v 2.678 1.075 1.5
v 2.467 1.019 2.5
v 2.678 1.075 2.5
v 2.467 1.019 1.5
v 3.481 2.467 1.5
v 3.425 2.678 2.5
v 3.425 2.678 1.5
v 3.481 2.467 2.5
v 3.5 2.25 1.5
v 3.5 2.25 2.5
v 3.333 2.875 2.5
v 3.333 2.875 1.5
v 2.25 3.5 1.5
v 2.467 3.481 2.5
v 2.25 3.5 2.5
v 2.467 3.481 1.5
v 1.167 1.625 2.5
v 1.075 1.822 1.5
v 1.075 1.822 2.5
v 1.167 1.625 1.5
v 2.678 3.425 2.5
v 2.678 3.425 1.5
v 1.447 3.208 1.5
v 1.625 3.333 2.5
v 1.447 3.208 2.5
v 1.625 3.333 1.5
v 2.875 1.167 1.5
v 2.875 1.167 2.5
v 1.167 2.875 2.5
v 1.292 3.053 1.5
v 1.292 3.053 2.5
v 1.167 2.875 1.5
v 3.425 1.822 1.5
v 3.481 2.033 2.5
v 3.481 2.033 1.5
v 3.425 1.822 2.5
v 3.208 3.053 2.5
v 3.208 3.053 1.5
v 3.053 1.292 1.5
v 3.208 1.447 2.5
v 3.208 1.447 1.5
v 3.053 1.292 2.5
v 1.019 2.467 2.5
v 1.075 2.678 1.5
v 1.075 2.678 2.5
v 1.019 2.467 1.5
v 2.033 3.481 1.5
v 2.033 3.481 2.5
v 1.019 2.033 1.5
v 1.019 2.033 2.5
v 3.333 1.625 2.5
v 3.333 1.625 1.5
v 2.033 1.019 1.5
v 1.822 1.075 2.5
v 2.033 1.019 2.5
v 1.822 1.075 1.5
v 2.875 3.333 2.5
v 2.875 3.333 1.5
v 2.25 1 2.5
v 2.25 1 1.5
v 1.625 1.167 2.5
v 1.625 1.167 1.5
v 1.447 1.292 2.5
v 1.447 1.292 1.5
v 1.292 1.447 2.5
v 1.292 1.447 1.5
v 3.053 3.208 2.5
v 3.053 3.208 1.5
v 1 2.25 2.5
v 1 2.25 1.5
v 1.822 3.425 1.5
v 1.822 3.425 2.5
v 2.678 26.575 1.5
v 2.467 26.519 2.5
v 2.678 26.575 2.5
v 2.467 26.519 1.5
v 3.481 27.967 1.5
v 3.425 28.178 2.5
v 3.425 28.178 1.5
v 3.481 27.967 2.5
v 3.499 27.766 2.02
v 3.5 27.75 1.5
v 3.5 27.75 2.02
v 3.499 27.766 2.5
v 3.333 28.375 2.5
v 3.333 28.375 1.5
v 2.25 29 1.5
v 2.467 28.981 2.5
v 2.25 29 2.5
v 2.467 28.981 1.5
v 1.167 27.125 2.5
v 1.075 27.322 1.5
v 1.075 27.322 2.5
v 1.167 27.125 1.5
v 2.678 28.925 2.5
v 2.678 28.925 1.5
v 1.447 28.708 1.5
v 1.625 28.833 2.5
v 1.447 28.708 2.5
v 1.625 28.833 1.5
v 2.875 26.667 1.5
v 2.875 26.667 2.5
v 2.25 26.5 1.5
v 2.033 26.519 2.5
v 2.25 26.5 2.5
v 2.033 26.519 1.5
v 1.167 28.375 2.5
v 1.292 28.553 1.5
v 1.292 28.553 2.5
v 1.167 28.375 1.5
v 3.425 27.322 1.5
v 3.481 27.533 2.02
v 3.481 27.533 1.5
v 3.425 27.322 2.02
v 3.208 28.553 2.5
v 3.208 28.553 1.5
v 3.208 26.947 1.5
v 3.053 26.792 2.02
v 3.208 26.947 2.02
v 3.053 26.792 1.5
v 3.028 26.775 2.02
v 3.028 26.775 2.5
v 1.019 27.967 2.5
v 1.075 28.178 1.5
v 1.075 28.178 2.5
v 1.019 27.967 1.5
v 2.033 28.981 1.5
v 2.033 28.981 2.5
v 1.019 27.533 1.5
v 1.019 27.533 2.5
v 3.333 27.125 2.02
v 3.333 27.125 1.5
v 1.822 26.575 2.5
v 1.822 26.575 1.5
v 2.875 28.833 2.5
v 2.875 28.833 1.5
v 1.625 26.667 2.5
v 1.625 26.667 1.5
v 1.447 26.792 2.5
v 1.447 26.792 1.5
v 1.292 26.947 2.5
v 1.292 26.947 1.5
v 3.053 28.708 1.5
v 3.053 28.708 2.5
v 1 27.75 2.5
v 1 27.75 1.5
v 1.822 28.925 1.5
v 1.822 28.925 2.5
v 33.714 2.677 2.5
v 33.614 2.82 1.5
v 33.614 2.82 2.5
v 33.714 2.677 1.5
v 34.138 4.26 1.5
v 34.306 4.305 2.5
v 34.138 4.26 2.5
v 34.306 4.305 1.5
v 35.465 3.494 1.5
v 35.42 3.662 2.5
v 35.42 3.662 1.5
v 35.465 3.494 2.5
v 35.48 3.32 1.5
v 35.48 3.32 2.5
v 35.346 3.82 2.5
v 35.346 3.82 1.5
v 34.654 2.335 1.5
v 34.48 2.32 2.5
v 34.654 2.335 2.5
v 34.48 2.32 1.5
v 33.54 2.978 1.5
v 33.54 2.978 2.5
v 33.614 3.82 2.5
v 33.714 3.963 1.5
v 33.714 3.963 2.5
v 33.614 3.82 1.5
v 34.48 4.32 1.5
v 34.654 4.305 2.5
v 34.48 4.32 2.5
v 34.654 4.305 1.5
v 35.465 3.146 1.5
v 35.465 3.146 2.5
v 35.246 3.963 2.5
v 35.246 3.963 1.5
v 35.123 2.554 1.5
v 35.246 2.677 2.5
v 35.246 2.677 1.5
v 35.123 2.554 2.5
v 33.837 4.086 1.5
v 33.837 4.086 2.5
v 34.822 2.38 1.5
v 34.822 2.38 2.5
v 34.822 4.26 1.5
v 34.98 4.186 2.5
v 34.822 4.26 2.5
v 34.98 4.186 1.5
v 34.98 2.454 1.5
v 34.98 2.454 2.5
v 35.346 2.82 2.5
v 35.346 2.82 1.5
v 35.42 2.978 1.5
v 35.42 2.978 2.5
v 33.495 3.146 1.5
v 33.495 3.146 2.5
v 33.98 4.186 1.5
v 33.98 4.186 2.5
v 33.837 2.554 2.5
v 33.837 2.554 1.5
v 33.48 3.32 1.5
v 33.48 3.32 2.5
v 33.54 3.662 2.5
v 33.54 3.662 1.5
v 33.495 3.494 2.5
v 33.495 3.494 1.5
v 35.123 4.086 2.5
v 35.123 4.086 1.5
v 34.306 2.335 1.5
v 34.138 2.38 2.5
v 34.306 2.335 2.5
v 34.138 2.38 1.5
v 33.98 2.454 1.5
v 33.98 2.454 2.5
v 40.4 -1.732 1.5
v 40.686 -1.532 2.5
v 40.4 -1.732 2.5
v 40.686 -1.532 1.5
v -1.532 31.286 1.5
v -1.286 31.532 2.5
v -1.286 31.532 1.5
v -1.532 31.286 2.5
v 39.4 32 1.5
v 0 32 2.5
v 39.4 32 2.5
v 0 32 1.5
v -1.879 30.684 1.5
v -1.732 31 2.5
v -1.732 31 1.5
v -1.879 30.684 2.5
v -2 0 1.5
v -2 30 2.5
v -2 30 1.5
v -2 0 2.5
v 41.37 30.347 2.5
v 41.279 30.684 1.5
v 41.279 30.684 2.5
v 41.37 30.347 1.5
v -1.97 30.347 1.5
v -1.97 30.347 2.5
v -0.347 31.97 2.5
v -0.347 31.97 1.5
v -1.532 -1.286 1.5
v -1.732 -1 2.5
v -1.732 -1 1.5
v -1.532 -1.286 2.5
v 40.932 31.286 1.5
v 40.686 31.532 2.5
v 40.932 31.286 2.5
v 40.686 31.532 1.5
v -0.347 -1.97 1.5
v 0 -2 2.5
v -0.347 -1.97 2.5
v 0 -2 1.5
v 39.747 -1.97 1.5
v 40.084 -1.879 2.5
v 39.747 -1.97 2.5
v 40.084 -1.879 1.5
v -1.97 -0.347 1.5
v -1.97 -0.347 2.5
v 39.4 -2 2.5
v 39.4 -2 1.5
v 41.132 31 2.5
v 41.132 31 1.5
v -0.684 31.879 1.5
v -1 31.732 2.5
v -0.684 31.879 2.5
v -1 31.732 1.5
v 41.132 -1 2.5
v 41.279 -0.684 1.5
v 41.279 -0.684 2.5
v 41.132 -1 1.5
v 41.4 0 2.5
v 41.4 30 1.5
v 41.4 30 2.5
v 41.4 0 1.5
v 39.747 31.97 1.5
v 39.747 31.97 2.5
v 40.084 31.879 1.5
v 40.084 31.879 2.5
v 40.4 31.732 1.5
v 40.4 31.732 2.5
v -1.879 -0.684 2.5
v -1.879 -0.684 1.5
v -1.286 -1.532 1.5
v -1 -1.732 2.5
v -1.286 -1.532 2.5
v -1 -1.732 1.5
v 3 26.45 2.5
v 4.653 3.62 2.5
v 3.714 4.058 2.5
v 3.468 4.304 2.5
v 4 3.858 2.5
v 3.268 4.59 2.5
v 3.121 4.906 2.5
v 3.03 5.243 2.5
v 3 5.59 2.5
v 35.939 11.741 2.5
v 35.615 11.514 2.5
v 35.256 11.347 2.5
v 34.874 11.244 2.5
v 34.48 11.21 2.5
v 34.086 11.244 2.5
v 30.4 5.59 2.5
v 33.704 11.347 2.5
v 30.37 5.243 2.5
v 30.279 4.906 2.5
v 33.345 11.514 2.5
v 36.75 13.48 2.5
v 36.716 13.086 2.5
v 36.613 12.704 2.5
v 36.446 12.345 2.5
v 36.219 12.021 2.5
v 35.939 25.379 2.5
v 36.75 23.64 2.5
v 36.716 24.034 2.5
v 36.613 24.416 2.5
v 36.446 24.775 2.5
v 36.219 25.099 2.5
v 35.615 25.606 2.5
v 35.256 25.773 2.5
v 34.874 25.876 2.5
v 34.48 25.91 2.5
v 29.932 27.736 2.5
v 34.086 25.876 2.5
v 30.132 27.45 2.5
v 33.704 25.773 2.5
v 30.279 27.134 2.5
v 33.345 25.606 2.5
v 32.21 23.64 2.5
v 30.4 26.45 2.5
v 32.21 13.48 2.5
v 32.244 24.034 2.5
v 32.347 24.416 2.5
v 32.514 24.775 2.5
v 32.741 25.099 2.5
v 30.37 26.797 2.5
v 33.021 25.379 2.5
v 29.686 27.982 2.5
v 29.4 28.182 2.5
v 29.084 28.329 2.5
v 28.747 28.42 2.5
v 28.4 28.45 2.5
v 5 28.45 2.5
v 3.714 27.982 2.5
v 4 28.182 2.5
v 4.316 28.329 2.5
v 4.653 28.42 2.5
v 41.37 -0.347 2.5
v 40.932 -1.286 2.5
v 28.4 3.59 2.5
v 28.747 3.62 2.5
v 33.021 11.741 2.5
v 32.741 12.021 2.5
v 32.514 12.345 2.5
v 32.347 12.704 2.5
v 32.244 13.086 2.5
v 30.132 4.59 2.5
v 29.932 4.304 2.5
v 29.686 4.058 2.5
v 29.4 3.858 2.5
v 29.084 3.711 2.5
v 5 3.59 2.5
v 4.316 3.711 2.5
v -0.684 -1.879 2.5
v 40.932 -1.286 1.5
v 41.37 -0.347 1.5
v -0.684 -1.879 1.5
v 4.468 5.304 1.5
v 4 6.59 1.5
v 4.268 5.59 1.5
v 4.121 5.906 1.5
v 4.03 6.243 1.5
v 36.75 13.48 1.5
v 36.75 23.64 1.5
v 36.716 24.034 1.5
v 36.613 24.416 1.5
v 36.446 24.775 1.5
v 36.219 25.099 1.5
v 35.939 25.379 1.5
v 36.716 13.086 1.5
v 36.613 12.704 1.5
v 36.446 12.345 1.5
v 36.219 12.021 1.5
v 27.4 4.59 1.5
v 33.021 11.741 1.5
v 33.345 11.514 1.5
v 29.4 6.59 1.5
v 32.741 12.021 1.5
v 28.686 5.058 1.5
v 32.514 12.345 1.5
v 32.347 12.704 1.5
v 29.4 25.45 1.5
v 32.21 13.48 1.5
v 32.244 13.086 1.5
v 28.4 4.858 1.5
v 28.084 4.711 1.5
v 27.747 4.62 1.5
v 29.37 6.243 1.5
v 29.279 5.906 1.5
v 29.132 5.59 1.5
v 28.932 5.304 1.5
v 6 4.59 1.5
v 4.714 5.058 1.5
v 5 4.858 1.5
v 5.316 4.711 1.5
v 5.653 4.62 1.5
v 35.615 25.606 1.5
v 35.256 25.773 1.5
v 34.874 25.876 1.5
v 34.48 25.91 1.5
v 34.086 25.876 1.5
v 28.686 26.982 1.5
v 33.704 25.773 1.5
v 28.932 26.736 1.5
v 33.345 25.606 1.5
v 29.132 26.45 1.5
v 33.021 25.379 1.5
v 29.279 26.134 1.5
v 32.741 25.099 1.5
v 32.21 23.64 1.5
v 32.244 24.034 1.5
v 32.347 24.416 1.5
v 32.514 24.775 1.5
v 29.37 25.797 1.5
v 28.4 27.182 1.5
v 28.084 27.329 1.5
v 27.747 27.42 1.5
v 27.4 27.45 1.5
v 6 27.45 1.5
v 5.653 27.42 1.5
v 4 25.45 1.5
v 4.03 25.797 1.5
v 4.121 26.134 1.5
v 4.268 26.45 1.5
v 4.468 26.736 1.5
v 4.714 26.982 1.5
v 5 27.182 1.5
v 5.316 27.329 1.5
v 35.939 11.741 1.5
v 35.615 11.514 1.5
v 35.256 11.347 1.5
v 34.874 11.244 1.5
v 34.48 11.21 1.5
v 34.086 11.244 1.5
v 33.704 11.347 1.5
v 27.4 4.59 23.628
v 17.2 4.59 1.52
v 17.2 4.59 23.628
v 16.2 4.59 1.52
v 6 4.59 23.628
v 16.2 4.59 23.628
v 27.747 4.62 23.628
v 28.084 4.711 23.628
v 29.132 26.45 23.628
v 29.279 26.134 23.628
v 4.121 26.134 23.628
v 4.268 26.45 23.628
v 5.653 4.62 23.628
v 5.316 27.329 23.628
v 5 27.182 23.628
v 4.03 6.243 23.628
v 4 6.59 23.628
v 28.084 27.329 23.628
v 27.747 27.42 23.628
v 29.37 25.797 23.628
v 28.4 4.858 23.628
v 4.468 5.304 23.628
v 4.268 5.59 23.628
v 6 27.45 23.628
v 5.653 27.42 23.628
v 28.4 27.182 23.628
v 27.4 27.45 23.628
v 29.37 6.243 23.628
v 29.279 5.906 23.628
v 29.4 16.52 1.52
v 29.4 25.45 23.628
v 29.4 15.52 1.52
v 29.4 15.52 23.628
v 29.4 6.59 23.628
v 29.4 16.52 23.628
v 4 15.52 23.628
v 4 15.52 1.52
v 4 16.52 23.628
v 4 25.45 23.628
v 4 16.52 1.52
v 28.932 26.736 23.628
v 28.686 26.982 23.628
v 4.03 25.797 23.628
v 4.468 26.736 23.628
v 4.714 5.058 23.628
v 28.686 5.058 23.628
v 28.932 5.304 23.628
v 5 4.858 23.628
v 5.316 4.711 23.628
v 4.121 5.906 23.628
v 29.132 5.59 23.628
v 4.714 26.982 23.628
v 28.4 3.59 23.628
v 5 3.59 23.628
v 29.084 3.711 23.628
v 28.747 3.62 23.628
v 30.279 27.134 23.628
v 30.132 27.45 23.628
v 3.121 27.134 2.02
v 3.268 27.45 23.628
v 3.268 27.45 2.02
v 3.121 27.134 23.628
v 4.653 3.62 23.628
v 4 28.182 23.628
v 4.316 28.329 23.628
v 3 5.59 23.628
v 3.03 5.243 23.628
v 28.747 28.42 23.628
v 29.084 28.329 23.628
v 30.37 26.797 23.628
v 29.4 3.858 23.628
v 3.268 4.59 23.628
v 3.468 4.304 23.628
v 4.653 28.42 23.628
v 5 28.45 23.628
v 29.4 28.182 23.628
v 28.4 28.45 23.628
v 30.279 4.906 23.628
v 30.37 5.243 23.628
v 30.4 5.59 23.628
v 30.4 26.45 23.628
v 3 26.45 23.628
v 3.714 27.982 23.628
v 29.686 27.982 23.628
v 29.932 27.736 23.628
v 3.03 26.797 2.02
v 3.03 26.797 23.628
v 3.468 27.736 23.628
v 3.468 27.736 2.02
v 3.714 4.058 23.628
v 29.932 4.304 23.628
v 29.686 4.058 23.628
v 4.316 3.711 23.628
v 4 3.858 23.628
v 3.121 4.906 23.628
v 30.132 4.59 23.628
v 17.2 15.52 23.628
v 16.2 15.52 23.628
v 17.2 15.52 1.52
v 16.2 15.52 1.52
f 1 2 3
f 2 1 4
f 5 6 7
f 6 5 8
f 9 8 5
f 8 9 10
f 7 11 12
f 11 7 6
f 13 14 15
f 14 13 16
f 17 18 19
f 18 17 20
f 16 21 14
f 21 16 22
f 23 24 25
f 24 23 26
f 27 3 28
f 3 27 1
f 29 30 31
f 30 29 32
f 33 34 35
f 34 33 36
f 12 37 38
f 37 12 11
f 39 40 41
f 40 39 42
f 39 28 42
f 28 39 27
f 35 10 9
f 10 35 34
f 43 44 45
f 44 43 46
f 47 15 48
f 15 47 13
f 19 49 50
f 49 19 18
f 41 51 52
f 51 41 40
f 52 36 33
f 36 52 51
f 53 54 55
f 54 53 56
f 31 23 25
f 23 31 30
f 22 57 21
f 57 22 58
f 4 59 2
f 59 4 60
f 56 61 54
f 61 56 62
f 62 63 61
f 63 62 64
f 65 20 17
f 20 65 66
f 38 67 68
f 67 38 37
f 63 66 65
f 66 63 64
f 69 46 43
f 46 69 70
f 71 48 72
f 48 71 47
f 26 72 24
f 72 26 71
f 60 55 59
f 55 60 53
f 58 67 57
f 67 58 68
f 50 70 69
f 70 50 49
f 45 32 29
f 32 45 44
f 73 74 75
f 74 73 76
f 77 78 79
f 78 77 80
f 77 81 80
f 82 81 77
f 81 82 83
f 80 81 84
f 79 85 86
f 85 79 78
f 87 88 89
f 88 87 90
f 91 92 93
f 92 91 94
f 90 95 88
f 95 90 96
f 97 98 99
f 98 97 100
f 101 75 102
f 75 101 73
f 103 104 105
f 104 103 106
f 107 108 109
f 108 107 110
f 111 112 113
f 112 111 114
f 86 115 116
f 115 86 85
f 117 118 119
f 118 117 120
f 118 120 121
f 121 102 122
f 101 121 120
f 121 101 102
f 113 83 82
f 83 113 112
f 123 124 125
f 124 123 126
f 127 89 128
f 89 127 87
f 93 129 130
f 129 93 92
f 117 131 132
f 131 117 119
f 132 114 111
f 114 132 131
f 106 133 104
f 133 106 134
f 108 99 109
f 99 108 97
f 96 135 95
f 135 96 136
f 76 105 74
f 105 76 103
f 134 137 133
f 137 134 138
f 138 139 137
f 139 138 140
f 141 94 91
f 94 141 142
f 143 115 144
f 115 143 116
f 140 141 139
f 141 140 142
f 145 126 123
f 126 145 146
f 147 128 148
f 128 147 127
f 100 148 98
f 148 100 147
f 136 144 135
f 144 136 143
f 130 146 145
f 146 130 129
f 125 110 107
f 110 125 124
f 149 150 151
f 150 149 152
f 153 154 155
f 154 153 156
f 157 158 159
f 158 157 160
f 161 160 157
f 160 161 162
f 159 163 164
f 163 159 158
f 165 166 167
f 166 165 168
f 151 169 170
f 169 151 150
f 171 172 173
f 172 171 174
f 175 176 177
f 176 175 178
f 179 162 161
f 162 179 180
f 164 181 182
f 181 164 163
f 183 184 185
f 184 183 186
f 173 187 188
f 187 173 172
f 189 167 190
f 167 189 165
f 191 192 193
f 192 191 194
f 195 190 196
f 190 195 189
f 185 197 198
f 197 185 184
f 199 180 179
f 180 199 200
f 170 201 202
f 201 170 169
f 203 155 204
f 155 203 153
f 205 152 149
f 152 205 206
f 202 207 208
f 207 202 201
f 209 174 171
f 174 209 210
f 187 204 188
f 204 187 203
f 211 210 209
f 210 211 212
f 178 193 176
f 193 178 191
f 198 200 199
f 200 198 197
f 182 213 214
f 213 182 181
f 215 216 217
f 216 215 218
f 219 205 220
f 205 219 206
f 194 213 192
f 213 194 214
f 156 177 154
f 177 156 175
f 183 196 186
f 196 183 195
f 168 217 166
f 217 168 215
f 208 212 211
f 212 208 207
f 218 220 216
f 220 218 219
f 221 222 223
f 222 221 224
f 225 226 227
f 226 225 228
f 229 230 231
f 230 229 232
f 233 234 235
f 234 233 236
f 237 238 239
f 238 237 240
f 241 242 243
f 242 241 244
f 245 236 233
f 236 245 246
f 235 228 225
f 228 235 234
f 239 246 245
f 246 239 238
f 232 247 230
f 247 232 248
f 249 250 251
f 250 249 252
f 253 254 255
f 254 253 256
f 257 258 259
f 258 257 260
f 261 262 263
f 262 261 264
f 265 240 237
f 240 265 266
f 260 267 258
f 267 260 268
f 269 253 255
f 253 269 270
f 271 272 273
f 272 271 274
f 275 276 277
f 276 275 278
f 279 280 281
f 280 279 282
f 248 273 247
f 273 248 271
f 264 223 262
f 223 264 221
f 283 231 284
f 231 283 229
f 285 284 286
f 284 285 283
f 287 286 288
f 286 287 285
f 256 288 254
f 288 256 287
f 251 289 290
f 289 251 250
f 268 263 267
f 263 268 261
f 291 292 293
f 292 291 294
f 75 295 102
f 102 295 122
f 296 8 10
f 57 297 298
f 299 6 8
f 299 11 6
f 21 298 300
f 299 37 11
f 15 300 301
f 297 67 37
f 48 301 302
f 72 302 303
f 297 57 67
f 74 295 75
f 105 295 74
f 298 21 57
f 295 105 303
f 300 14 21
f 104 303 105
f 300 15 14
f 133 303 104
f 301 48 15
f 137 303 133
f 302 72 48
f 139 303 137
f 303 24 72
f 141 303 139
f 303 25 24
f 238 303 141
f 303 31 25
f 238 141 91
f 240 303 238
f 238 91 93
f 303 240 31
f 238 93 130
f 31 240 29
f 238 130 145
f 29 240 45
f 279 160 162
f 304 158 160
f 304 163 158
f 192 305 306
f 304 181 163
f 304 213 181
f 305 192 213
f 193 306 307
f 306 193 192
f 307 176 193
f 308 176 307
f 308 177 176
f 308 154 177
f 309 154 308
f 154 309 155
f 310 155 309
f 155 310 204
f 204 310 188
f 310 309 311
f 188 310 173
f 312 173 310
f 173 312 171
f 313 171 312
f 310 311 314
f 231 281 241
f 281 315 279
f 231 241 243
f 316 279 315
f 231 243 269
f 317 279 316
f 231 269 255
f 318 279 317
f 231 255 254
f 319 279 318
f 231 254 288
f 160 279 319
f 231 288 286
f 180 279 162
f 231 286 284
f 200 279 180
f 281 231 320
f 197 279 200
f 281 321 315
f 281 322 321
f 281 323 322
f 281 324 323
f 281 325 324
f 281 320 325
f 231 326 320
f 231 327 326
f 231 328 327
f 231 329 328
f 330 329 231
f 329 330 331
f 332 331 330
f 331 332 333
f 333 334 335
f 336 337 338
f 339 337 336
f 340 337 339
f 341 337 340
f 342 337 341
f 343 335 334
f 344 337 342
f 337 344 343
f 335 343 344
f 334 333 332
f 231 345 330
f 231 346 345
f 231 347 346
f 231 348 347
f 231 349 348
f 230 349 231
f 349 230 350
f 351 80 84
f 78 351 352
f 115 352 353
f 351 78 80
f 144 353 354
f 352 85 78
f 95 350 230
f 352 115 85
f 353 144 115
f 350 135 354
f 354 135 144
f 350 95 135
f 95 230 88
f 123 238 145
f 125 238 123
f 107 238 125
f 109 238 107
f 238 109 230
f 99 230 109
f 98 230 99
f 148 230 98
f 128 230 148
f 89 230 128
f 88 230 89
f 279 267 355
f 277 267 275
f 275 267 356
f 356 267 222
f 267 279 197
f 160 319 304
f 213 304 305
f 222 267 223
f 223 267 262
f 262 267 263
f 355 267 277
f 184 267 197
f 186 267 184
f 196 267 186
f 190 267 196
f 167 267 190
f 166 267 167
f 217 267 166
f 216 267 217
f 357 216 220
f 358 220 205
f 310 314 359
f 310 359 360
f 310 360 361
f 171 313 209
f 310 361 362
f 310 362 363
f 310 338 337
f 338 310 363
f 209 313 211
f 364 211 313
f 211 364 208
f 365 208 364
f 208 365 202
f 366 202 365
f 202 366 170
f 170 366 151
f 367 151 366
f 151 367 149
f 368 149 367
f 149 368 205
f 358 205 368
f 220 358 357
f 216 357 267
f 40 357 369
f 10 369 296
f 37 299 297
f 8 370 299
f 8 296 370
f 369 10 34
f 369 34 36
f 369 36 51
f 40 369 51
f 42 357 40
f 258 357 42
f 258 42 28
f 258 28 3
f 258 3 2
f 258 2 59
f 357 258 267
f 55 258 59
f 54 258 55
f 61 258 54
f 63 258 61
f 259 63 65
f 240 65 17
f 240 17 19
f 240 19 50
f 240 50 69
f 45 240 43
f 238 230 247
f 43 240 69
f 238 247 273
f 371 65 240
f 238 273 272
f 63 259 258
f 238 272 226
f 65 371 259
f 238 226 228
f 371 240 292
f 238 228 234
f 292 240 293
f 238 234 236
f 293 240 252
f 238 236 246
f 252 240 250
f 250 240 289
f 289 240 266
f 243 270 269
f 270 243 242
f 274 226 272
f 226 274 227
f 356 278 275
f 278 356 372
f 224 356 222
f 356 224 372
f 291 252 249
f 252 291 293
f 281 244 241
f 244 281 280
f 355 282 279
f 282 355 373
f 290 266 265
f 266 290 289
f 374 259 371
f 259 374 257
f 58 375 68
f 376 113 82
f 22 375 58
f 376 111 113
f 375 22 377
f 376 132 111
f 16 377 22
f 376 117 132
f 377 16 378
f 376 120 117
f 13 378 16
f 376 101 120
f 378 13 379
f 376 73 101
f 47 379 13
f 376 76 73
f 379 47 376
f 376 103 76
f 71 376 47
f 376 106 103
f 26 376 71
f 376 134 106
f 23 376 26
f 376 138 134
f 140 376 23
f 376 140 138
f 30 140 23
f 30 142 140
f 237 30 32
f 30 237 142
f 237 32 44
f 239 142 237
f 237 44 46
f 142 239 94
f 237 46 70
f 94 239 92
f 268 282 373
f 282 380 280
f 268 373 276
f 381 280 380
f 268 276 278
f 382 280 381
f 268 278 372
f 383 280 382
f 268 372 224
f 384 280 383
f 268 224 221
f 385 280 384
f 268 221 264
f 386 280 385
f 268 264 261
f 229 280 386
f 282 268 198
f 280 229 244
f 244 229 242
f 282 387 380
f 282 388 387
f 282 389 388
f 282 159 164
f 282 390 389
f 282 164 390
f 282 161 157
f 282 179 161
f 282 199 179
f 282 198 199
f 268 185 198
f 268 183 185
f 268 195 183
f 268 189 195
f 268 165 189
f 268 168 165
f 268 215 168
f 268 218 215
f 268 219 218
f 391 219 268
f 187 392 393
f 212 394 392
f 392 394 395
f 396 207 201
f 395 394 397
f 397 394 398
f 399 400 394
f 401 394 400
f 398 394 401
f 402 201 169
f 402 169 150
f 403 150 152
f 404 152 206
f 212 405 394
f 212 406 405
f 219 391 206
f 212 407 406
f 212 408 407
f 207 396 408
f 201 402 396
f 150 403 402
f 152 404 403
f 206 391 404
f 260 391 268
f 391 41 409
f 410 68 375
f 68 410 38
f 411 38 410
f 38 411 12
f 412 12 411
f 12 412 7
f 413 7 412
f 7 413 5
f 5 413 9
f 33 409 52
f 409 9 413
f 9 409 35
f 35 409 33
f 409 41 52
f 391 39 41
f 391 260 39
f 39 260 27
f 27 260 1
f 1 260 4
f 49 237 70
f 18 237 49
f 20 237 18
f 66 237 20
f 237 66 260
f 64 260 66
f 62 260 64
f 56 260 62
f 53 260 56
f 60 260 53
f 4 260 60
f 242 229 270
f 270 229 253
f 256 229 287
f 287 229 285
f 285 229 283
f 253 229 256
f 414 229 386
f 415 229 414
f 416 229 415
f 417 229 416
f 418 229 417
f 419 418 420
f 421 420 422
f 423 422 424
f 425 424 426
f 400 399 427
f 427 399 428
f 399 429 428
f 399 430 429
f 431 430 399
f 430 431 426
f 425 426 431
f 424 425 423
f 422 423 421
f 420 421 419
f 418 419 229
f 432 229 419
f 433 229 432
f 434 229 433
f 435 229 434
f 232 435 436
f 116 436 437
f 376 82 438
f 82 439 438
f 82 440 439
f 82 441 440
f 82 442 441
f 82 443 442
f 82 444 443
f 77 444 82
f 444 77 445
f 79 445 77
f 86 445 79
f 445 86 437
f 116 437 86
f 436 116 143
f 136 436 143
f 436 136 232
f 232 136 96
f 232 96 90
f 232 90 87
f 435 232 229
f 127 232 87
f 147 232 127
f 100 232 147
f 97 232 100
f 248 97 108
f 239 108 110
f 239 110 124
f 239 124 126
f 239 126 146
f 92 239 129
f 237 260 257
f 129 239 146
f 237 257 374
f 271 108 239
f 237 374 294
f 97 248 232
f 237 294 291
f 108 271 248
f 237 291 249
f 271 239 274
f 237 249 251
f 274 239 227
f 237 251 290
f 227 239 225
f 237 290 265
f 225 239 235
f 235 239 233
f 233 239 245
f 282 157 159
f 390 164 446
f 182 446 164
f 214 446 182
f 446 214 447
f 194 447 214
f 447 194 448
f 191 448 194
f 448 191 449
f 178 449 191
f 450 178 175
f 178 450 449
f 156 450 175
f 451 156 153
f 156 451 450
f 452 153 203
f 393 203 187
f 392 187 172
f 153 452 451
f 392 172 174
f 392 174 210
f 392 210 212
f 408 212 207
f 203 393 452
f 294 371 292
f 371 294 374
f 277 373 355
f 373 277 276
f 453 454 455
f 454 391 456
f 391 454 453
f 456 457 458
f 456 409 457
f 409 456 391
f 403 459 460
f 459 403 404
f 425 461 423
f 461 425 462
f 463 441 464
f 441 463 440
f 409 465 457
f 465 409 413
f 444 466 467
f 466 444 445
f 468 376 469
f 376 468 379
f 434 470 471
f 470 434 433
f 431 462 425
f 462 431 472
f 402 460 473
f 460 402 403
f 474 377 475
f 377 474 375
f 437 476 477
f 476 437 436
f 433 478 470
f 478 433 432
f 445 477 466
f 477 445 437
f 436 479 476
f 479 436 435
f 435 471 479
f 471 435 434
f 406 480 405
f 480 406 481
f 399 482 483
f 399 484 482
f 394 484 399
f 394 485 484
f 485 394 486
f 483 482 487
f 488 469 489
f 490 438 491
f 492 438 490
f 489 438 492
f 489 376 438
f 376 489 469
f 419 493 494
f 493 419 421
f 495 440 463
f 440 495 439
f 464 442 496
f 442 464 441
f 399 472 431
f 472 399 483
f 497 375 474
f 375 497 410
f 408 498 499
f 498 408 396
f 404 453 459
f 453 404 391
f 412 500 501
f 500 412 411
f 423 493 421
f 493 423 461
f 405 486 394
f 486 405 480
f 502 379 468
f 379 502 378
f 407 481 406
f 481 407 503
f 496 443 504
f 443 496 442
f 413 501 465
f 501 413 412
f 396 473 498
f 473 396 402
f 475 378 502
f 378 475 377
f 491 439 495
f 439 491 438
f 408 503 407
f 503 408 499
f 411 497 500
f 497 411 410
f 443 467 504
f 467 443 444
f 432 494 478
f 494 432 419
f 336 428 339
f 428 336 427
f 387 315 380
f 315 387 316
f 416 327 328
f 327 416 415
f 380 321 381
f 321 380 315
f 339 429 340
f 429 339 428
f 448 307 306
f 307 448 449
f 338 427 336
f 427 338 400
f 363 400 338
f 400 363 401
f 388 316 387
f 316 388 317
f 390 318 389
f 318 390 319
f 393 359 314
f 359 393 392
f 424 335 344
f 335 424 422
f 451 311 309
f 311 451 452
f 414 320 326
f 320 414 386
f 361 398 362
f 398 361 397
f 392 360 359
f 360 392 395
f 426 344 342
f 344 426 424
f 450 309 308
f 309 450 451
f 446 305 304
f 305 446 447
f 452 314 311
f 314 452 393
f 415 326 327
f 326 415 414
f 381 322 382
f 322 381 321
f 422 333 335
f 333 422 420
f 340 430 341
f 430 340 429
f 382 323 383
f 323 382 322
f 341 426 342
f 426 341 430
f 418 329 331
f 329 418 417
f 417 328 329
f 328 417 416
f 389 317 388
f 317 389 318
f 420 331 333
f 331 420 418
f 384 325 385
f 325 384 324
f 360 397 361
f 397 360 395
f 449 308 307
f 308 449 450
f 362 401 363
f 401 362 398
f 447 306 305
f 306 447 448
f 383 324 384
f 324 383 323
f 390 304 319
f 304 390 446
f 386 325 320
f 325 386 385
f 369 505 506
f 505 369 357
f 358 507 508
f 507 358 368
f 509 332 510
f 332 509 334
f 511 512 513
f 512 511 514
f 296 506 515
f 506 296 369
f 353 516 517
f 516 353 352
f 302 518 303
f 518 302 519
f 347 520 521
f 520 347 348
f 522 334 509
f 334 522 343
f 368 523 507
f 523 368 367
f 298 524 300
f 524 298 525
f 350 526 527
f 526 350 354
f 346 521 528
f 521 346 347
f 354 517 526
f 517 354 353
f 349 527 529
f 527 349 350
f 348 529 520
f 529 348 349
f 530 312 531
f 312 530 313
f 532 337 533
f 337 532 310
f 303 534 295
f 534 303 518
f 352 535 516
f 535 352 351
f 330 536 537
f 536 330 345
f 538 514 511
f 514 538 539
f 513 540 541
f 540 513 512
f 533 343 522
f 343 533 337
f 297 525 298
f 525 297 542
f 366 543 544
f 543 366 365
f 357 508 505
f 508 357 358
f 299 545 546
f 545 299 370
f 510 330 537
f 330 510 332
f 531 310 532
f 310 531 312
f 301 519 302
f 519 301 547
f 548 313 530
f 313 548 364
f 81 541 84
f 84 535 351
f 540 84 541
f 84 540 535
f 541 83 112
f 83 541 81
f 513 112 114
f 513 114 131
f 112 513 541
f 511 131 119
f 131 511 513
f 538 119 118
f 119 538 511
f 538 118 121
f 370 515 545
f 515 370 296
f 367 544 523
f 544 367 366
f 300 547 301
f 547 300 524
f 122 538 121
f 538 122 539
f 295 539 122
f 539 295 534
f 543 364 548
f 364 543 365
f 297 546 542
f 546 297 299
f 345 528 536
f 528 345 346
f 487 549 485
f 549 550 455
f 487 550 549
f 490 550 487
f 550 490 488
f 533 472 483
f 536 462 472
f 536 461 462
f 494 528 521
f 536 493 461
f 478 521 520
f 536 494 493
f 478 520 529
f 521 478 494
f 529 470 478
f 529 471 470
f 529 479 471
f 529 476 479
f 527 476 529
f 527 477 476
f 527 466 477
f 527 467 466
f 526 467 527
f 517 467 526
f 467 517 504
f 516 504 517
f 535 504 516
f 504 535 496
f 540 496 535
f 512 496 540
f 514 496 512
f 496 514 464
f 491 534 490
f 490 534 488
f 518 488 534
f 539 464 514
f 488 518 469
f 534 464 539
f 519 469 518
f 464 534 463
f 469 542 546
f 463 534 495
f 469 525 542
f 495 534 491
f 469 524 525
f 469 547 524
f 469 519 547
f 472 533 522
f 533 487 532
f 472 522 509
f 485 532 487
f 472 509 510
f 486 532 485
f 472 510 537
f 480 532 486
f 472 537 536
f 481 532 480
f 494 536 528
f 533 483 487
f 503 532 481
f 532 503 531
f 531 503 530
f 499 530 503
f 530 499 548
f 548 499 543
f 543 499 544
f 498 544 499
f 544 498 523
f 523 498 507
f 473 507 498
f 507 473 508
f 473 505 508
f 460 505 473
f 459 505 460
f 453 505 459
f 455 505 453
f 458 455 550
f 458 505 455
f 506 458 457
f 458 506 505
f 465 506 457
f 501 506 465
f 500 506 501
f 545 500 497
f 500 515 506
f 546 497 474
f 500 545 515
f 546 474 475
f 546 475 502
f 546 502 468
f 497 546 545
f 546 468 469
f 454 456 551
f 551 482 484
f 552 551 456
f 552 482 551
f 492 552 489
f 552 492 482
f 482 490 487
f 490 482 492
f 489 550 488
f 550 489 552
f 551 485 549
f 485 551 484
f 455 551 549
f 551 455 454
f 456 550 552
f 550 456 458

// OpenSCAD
// file: case_bottom.scad
// SunTracker

use <sensor.scad>

*translate([0,0,.1]) sensor();

// overaall size of the bottom case
function case_bottom_box() = sensor_box()+[4,4,5.5];

// one cylinder for the rounded box used for design
module case_bottom_rounded(pt, h)
{
    translate(pt) 
    cylinder(r=2, h=h, $fn=36);
}

// blank used for the design
module case_bottom_blank()
{
    offset = [-2,-2,-5.5];
    pt = case_bottom_box();
    //translate(offset) cube(pt);
    translate(offset) hull() {
        case_bottom_rounded([2,2,0], h=pt[2]);
        case_bottom_rounded([2,pt[1]-2,0], h=pt[2]);
        case_bottom_rounded([pt[0]-2,pt[1]-2,0], h=pt[2]);
        case_bottom_rounded([pt[0]-2,2,0], h=pt[2]);
    }
}

// cutout of the sensor circuit board
module case_bottom_cutout()
{
    border = [0.5, 0.5, 0.5];
    translate(-border/2) 
    cube(sensor_box()+ border);
}

// mount holes for the circuit board for 4mm screws
module case_bottom_holes($fn=36)
{
    color("white")
    for (pt = sensor_mounts())
        translate(pt-[0,0,1.5])
    cylinder(d=mount_screw_dm(),h=4,center=true);
}

// pocket for the wires on back if the cicuit board
module case_bottom_pocket()
{
    pt0 = pcb_hole_pt(1,1);
    dxy = sensor_box() - pt0; 
    pti = [dxy[0], dxy[1], 4];
    ptm = [dxy[0]/6, 1.5*2.54, 4];
    translate([0,0,-3]) 
    translate(pt0-[2.54, 1.27, 0]) 
    color("white") 
    difference()
    {
        cube(pti);
        translate([dxy[0]/6*5,0,0]) cube(ptm);
    }
}

// all in one
module case_bottom() 
{
    difference() {
        case_bottom_blank();
        case_bottom_cutout();
        case_bottom_holes();
        case_bottom_pocket();
    }
    
}

case_bottom();
// file: sensor.scad
// SunTracker Sensor
// Platine [mm]
plate = [ 39.4, 30.0, 1.5];

function pcb_col_border() =
    plate[1] - 9 * 2.54 - 1.0/2.0;
    
function pcb_hole_pt(col, row) =
    [3+2.54+1, pcb_col_border()/2, 1.5/2] + 
    [(col-1)*2.54, (row-1)*2.54, 0];

module pcb_hole(col, row)
{
    translate(pcb_hole_pt(col, row))
        cylinder(d=1, h= 2*1.5, center=true, $fn=24);
}
module pcb_holes()
{
    for (col = [1:14])
        for (row = [1:10])
            pcb_hole(col, row);
}

function mount_screw_dm() = 2;
module mount_hole(pt, dm)
{
    translate(pt) 
        cylinder(d=dm, h=2*1.5, center=true, $fn=36);
}

function mount_hole_centers() = [
    // 2.5 mm 
    [1+2.5/2, 1+2.5/2, 1.5/2],
    // 2.5 mm 
    [1+2.5/2, plate[1]-(1+2.5/2), 1.5/2],
    // 2.0 mm 
    pcb_hole_pt(12,1)];

function mount_hole_dms() = [2.5, 2.5, 2];

module mount_holes()
{
    pts = mount_hole_centers();
    dms = mount_hole_dms();
    for (i = [0:2])
        mount_hole(pts[i], dms[i]);
}
module pcb() 
{
    difference() {
    color ("green") cube(plate);
    pcb_holes();
    mount_holes();
    }
    
}

*pcb();

module ldr(pt)
{
    color("red") 
    translate(pt) translate([0,0,1.5]) {
        hull() {
        translate([-2.54/2, 0, 0])
        cylinder(d=2.54, h=1, center=true,$fn=36);
        translate([2.54/2, 0, 0])
        cylinder(d=2.54, h=1, center=true, $fn=36);
        }
    }
}

module ldr_top() { ldr(pcb_hole_pt(5,9)); }
module ldr_left() { ldr(pcb_hole_pt(2,4)); }
module ldr_right() { ldr(pcb_hole_pt(8,4)); }

module ldrs()
{
    ldr_top();
    ldr_left();
    ldr_right();
}

*ldrs();

function sensor_connector_box() =
    [2.54, 5*2.54, 8];

function sensor_connector_pos() =
    pcb_hole_pt(12,7);

// the 5 pin connector
module connector(pt)
{
    box = sensor_connector_box();
    color("black")
    translate(pt) translate([0,0,box[2]/2])
    cube(box, true);
}

*connector(sensor_connector_pos);

module sensor()
{
    pcb();
    ldrs();
    connector(pcb_hole_pt(12,7));
}

sensor();

function sensor_box() = plate;
function sensor_mounts() = mount_hole_centers();
function sensor_mount_dms() = mount_hole_dms();
// main file
// SunTracker

use <sensor.scad>
use <case_bottom.scad>

*translate([0,0,.01]) sensor();
*case_bottom();

// blank used for the design
module case_top_blank()
{
    offset = [-2,-2,1.5];
    pt = case_bottom_box();
    //translate(offset) cube(pt);
    translate(offset) hull() {
        case_bottom_rounded([2,2,0], h=1);
        case_bottom_rounded([2,pt[1]-2,0], h=1);
        case_bottom_rounded([pt[0]-2,pt[1]-2,0], h=1);
        case_bottom_rounded([pt[0]-2,2,0], h=1);
    }
}

// cylinder used with rounded_cuve
module rounding(pt, h, r=2)
{
    translate(pt) 
    cylinder(r=r, h=h, $fn=36);
}

// rounded cube
module rounded_cube(size, r=2)
{
    pt = size;
    //translate(offset) cube(pt);
    hull() {
        rounding([r,r,0], h=pt[2]);
        rounding([r,pt[1]-r,0], h=pt[2]);
        rounding([pt[0]-r,pt[1]-r,0], h=pt[2]);
        rounding([pt[0]-r,r,0], h=pt[2]);
    }
    //cube(size);
}

// the size of the window
function case_top_window_size() =
    pcb_hole_pt(11,10) - 
    pcb_hole_pt(2,2) + 
    [2.54, 2.54, 2.54];

// the position of the window
function case_top_window_pos() =
    pcb_hole_pt(1,2)-
    [2.54, 2.54/2, 2.54/2];

// window in the blank
module case_top_cutout(h=4)
{
    dxy = case_top_window_size();
    pti = [dxy[0], dxy[1], h];
    translate(case_top_window_pos()) 
    rounded_cube(pti);
}

// the ouside sensor border
module case_top_hull(h=8)
{
    bo = [2,2,0];
    dxy = case_top_window_size() + bo;
    pti = [dxy[0], dxy[1], h];
    pt = case_top_window_pos()-bo/2+[0,0,2.54];
    translate(pt)
    rounded_cube(pti);
}

// addional wall inside the senser border
module case_top_hull_blinds(h=8)
{
    dxy = case_top_window_size()+[2,2,0];
    pth = [dxy[0], 1, h+0.5];
    ptv = [1, dxy[1]/2, h+0.5];
    translate(case_top_window_pos()+[0, dxy[1]/2-0.5, 2.54]-[1,1,0.5])
    cube(pth);
    translate(case_top_window_pos()+[dxy[0]/2-0.5, 0, 2.54]-[1,1,0.5])
    cube(ptv);
}

// height of the blinds needed
function shadow_height() = 3*2.54/2/tan(10);

// sensor border and the blinds
module case_top_shadow() 
{
    echo(shadow_height());
    h = shadow_height();
    hh = h;
    union() {
        difference() {
            case_top_hull(h=hh);
            case_top_cutout(h=hh+4);
        }
        case_top_hull_blinds(h=h);
    }
}

// connector cutout in the blank
module case_top_connector($fn=36)
{
    box = sensor_connector_box()+[2,-2.54,0];
    pt = sensor_connector_pos();
    hull() {
        translate(pt+[0,-box[1]/2,0])
            cylinder(r=box[0]/2,h=2);
        translate(pt+[0, box[1]/2,0])
            cylinder(r=box[0]/2,h=2);
    }
}

// single mount holes
module case_top_hole(pt,dm,$fn=36)
{
    translate(pt-[0,0,-1.5])
        cylinder(d=dm,h=4,center=true);
}

// mount holes for the circuit board
module case_top_holes($fn=36)
{
    pts = sensor_mounts();
    dms = sensor_mount_dms();
    for (i = [0:2])
        case_top_hole(pts[i], dms[i]);
}

// the top case of the sensor
module case_top()
{
    union() {
        difference() {
            case_top_blank();
            case_top_cutout();
            case_top_connector();
            case_top_holes();
        }
        case_top_shadow();
    }
     
}

color("khaki") case_top();
